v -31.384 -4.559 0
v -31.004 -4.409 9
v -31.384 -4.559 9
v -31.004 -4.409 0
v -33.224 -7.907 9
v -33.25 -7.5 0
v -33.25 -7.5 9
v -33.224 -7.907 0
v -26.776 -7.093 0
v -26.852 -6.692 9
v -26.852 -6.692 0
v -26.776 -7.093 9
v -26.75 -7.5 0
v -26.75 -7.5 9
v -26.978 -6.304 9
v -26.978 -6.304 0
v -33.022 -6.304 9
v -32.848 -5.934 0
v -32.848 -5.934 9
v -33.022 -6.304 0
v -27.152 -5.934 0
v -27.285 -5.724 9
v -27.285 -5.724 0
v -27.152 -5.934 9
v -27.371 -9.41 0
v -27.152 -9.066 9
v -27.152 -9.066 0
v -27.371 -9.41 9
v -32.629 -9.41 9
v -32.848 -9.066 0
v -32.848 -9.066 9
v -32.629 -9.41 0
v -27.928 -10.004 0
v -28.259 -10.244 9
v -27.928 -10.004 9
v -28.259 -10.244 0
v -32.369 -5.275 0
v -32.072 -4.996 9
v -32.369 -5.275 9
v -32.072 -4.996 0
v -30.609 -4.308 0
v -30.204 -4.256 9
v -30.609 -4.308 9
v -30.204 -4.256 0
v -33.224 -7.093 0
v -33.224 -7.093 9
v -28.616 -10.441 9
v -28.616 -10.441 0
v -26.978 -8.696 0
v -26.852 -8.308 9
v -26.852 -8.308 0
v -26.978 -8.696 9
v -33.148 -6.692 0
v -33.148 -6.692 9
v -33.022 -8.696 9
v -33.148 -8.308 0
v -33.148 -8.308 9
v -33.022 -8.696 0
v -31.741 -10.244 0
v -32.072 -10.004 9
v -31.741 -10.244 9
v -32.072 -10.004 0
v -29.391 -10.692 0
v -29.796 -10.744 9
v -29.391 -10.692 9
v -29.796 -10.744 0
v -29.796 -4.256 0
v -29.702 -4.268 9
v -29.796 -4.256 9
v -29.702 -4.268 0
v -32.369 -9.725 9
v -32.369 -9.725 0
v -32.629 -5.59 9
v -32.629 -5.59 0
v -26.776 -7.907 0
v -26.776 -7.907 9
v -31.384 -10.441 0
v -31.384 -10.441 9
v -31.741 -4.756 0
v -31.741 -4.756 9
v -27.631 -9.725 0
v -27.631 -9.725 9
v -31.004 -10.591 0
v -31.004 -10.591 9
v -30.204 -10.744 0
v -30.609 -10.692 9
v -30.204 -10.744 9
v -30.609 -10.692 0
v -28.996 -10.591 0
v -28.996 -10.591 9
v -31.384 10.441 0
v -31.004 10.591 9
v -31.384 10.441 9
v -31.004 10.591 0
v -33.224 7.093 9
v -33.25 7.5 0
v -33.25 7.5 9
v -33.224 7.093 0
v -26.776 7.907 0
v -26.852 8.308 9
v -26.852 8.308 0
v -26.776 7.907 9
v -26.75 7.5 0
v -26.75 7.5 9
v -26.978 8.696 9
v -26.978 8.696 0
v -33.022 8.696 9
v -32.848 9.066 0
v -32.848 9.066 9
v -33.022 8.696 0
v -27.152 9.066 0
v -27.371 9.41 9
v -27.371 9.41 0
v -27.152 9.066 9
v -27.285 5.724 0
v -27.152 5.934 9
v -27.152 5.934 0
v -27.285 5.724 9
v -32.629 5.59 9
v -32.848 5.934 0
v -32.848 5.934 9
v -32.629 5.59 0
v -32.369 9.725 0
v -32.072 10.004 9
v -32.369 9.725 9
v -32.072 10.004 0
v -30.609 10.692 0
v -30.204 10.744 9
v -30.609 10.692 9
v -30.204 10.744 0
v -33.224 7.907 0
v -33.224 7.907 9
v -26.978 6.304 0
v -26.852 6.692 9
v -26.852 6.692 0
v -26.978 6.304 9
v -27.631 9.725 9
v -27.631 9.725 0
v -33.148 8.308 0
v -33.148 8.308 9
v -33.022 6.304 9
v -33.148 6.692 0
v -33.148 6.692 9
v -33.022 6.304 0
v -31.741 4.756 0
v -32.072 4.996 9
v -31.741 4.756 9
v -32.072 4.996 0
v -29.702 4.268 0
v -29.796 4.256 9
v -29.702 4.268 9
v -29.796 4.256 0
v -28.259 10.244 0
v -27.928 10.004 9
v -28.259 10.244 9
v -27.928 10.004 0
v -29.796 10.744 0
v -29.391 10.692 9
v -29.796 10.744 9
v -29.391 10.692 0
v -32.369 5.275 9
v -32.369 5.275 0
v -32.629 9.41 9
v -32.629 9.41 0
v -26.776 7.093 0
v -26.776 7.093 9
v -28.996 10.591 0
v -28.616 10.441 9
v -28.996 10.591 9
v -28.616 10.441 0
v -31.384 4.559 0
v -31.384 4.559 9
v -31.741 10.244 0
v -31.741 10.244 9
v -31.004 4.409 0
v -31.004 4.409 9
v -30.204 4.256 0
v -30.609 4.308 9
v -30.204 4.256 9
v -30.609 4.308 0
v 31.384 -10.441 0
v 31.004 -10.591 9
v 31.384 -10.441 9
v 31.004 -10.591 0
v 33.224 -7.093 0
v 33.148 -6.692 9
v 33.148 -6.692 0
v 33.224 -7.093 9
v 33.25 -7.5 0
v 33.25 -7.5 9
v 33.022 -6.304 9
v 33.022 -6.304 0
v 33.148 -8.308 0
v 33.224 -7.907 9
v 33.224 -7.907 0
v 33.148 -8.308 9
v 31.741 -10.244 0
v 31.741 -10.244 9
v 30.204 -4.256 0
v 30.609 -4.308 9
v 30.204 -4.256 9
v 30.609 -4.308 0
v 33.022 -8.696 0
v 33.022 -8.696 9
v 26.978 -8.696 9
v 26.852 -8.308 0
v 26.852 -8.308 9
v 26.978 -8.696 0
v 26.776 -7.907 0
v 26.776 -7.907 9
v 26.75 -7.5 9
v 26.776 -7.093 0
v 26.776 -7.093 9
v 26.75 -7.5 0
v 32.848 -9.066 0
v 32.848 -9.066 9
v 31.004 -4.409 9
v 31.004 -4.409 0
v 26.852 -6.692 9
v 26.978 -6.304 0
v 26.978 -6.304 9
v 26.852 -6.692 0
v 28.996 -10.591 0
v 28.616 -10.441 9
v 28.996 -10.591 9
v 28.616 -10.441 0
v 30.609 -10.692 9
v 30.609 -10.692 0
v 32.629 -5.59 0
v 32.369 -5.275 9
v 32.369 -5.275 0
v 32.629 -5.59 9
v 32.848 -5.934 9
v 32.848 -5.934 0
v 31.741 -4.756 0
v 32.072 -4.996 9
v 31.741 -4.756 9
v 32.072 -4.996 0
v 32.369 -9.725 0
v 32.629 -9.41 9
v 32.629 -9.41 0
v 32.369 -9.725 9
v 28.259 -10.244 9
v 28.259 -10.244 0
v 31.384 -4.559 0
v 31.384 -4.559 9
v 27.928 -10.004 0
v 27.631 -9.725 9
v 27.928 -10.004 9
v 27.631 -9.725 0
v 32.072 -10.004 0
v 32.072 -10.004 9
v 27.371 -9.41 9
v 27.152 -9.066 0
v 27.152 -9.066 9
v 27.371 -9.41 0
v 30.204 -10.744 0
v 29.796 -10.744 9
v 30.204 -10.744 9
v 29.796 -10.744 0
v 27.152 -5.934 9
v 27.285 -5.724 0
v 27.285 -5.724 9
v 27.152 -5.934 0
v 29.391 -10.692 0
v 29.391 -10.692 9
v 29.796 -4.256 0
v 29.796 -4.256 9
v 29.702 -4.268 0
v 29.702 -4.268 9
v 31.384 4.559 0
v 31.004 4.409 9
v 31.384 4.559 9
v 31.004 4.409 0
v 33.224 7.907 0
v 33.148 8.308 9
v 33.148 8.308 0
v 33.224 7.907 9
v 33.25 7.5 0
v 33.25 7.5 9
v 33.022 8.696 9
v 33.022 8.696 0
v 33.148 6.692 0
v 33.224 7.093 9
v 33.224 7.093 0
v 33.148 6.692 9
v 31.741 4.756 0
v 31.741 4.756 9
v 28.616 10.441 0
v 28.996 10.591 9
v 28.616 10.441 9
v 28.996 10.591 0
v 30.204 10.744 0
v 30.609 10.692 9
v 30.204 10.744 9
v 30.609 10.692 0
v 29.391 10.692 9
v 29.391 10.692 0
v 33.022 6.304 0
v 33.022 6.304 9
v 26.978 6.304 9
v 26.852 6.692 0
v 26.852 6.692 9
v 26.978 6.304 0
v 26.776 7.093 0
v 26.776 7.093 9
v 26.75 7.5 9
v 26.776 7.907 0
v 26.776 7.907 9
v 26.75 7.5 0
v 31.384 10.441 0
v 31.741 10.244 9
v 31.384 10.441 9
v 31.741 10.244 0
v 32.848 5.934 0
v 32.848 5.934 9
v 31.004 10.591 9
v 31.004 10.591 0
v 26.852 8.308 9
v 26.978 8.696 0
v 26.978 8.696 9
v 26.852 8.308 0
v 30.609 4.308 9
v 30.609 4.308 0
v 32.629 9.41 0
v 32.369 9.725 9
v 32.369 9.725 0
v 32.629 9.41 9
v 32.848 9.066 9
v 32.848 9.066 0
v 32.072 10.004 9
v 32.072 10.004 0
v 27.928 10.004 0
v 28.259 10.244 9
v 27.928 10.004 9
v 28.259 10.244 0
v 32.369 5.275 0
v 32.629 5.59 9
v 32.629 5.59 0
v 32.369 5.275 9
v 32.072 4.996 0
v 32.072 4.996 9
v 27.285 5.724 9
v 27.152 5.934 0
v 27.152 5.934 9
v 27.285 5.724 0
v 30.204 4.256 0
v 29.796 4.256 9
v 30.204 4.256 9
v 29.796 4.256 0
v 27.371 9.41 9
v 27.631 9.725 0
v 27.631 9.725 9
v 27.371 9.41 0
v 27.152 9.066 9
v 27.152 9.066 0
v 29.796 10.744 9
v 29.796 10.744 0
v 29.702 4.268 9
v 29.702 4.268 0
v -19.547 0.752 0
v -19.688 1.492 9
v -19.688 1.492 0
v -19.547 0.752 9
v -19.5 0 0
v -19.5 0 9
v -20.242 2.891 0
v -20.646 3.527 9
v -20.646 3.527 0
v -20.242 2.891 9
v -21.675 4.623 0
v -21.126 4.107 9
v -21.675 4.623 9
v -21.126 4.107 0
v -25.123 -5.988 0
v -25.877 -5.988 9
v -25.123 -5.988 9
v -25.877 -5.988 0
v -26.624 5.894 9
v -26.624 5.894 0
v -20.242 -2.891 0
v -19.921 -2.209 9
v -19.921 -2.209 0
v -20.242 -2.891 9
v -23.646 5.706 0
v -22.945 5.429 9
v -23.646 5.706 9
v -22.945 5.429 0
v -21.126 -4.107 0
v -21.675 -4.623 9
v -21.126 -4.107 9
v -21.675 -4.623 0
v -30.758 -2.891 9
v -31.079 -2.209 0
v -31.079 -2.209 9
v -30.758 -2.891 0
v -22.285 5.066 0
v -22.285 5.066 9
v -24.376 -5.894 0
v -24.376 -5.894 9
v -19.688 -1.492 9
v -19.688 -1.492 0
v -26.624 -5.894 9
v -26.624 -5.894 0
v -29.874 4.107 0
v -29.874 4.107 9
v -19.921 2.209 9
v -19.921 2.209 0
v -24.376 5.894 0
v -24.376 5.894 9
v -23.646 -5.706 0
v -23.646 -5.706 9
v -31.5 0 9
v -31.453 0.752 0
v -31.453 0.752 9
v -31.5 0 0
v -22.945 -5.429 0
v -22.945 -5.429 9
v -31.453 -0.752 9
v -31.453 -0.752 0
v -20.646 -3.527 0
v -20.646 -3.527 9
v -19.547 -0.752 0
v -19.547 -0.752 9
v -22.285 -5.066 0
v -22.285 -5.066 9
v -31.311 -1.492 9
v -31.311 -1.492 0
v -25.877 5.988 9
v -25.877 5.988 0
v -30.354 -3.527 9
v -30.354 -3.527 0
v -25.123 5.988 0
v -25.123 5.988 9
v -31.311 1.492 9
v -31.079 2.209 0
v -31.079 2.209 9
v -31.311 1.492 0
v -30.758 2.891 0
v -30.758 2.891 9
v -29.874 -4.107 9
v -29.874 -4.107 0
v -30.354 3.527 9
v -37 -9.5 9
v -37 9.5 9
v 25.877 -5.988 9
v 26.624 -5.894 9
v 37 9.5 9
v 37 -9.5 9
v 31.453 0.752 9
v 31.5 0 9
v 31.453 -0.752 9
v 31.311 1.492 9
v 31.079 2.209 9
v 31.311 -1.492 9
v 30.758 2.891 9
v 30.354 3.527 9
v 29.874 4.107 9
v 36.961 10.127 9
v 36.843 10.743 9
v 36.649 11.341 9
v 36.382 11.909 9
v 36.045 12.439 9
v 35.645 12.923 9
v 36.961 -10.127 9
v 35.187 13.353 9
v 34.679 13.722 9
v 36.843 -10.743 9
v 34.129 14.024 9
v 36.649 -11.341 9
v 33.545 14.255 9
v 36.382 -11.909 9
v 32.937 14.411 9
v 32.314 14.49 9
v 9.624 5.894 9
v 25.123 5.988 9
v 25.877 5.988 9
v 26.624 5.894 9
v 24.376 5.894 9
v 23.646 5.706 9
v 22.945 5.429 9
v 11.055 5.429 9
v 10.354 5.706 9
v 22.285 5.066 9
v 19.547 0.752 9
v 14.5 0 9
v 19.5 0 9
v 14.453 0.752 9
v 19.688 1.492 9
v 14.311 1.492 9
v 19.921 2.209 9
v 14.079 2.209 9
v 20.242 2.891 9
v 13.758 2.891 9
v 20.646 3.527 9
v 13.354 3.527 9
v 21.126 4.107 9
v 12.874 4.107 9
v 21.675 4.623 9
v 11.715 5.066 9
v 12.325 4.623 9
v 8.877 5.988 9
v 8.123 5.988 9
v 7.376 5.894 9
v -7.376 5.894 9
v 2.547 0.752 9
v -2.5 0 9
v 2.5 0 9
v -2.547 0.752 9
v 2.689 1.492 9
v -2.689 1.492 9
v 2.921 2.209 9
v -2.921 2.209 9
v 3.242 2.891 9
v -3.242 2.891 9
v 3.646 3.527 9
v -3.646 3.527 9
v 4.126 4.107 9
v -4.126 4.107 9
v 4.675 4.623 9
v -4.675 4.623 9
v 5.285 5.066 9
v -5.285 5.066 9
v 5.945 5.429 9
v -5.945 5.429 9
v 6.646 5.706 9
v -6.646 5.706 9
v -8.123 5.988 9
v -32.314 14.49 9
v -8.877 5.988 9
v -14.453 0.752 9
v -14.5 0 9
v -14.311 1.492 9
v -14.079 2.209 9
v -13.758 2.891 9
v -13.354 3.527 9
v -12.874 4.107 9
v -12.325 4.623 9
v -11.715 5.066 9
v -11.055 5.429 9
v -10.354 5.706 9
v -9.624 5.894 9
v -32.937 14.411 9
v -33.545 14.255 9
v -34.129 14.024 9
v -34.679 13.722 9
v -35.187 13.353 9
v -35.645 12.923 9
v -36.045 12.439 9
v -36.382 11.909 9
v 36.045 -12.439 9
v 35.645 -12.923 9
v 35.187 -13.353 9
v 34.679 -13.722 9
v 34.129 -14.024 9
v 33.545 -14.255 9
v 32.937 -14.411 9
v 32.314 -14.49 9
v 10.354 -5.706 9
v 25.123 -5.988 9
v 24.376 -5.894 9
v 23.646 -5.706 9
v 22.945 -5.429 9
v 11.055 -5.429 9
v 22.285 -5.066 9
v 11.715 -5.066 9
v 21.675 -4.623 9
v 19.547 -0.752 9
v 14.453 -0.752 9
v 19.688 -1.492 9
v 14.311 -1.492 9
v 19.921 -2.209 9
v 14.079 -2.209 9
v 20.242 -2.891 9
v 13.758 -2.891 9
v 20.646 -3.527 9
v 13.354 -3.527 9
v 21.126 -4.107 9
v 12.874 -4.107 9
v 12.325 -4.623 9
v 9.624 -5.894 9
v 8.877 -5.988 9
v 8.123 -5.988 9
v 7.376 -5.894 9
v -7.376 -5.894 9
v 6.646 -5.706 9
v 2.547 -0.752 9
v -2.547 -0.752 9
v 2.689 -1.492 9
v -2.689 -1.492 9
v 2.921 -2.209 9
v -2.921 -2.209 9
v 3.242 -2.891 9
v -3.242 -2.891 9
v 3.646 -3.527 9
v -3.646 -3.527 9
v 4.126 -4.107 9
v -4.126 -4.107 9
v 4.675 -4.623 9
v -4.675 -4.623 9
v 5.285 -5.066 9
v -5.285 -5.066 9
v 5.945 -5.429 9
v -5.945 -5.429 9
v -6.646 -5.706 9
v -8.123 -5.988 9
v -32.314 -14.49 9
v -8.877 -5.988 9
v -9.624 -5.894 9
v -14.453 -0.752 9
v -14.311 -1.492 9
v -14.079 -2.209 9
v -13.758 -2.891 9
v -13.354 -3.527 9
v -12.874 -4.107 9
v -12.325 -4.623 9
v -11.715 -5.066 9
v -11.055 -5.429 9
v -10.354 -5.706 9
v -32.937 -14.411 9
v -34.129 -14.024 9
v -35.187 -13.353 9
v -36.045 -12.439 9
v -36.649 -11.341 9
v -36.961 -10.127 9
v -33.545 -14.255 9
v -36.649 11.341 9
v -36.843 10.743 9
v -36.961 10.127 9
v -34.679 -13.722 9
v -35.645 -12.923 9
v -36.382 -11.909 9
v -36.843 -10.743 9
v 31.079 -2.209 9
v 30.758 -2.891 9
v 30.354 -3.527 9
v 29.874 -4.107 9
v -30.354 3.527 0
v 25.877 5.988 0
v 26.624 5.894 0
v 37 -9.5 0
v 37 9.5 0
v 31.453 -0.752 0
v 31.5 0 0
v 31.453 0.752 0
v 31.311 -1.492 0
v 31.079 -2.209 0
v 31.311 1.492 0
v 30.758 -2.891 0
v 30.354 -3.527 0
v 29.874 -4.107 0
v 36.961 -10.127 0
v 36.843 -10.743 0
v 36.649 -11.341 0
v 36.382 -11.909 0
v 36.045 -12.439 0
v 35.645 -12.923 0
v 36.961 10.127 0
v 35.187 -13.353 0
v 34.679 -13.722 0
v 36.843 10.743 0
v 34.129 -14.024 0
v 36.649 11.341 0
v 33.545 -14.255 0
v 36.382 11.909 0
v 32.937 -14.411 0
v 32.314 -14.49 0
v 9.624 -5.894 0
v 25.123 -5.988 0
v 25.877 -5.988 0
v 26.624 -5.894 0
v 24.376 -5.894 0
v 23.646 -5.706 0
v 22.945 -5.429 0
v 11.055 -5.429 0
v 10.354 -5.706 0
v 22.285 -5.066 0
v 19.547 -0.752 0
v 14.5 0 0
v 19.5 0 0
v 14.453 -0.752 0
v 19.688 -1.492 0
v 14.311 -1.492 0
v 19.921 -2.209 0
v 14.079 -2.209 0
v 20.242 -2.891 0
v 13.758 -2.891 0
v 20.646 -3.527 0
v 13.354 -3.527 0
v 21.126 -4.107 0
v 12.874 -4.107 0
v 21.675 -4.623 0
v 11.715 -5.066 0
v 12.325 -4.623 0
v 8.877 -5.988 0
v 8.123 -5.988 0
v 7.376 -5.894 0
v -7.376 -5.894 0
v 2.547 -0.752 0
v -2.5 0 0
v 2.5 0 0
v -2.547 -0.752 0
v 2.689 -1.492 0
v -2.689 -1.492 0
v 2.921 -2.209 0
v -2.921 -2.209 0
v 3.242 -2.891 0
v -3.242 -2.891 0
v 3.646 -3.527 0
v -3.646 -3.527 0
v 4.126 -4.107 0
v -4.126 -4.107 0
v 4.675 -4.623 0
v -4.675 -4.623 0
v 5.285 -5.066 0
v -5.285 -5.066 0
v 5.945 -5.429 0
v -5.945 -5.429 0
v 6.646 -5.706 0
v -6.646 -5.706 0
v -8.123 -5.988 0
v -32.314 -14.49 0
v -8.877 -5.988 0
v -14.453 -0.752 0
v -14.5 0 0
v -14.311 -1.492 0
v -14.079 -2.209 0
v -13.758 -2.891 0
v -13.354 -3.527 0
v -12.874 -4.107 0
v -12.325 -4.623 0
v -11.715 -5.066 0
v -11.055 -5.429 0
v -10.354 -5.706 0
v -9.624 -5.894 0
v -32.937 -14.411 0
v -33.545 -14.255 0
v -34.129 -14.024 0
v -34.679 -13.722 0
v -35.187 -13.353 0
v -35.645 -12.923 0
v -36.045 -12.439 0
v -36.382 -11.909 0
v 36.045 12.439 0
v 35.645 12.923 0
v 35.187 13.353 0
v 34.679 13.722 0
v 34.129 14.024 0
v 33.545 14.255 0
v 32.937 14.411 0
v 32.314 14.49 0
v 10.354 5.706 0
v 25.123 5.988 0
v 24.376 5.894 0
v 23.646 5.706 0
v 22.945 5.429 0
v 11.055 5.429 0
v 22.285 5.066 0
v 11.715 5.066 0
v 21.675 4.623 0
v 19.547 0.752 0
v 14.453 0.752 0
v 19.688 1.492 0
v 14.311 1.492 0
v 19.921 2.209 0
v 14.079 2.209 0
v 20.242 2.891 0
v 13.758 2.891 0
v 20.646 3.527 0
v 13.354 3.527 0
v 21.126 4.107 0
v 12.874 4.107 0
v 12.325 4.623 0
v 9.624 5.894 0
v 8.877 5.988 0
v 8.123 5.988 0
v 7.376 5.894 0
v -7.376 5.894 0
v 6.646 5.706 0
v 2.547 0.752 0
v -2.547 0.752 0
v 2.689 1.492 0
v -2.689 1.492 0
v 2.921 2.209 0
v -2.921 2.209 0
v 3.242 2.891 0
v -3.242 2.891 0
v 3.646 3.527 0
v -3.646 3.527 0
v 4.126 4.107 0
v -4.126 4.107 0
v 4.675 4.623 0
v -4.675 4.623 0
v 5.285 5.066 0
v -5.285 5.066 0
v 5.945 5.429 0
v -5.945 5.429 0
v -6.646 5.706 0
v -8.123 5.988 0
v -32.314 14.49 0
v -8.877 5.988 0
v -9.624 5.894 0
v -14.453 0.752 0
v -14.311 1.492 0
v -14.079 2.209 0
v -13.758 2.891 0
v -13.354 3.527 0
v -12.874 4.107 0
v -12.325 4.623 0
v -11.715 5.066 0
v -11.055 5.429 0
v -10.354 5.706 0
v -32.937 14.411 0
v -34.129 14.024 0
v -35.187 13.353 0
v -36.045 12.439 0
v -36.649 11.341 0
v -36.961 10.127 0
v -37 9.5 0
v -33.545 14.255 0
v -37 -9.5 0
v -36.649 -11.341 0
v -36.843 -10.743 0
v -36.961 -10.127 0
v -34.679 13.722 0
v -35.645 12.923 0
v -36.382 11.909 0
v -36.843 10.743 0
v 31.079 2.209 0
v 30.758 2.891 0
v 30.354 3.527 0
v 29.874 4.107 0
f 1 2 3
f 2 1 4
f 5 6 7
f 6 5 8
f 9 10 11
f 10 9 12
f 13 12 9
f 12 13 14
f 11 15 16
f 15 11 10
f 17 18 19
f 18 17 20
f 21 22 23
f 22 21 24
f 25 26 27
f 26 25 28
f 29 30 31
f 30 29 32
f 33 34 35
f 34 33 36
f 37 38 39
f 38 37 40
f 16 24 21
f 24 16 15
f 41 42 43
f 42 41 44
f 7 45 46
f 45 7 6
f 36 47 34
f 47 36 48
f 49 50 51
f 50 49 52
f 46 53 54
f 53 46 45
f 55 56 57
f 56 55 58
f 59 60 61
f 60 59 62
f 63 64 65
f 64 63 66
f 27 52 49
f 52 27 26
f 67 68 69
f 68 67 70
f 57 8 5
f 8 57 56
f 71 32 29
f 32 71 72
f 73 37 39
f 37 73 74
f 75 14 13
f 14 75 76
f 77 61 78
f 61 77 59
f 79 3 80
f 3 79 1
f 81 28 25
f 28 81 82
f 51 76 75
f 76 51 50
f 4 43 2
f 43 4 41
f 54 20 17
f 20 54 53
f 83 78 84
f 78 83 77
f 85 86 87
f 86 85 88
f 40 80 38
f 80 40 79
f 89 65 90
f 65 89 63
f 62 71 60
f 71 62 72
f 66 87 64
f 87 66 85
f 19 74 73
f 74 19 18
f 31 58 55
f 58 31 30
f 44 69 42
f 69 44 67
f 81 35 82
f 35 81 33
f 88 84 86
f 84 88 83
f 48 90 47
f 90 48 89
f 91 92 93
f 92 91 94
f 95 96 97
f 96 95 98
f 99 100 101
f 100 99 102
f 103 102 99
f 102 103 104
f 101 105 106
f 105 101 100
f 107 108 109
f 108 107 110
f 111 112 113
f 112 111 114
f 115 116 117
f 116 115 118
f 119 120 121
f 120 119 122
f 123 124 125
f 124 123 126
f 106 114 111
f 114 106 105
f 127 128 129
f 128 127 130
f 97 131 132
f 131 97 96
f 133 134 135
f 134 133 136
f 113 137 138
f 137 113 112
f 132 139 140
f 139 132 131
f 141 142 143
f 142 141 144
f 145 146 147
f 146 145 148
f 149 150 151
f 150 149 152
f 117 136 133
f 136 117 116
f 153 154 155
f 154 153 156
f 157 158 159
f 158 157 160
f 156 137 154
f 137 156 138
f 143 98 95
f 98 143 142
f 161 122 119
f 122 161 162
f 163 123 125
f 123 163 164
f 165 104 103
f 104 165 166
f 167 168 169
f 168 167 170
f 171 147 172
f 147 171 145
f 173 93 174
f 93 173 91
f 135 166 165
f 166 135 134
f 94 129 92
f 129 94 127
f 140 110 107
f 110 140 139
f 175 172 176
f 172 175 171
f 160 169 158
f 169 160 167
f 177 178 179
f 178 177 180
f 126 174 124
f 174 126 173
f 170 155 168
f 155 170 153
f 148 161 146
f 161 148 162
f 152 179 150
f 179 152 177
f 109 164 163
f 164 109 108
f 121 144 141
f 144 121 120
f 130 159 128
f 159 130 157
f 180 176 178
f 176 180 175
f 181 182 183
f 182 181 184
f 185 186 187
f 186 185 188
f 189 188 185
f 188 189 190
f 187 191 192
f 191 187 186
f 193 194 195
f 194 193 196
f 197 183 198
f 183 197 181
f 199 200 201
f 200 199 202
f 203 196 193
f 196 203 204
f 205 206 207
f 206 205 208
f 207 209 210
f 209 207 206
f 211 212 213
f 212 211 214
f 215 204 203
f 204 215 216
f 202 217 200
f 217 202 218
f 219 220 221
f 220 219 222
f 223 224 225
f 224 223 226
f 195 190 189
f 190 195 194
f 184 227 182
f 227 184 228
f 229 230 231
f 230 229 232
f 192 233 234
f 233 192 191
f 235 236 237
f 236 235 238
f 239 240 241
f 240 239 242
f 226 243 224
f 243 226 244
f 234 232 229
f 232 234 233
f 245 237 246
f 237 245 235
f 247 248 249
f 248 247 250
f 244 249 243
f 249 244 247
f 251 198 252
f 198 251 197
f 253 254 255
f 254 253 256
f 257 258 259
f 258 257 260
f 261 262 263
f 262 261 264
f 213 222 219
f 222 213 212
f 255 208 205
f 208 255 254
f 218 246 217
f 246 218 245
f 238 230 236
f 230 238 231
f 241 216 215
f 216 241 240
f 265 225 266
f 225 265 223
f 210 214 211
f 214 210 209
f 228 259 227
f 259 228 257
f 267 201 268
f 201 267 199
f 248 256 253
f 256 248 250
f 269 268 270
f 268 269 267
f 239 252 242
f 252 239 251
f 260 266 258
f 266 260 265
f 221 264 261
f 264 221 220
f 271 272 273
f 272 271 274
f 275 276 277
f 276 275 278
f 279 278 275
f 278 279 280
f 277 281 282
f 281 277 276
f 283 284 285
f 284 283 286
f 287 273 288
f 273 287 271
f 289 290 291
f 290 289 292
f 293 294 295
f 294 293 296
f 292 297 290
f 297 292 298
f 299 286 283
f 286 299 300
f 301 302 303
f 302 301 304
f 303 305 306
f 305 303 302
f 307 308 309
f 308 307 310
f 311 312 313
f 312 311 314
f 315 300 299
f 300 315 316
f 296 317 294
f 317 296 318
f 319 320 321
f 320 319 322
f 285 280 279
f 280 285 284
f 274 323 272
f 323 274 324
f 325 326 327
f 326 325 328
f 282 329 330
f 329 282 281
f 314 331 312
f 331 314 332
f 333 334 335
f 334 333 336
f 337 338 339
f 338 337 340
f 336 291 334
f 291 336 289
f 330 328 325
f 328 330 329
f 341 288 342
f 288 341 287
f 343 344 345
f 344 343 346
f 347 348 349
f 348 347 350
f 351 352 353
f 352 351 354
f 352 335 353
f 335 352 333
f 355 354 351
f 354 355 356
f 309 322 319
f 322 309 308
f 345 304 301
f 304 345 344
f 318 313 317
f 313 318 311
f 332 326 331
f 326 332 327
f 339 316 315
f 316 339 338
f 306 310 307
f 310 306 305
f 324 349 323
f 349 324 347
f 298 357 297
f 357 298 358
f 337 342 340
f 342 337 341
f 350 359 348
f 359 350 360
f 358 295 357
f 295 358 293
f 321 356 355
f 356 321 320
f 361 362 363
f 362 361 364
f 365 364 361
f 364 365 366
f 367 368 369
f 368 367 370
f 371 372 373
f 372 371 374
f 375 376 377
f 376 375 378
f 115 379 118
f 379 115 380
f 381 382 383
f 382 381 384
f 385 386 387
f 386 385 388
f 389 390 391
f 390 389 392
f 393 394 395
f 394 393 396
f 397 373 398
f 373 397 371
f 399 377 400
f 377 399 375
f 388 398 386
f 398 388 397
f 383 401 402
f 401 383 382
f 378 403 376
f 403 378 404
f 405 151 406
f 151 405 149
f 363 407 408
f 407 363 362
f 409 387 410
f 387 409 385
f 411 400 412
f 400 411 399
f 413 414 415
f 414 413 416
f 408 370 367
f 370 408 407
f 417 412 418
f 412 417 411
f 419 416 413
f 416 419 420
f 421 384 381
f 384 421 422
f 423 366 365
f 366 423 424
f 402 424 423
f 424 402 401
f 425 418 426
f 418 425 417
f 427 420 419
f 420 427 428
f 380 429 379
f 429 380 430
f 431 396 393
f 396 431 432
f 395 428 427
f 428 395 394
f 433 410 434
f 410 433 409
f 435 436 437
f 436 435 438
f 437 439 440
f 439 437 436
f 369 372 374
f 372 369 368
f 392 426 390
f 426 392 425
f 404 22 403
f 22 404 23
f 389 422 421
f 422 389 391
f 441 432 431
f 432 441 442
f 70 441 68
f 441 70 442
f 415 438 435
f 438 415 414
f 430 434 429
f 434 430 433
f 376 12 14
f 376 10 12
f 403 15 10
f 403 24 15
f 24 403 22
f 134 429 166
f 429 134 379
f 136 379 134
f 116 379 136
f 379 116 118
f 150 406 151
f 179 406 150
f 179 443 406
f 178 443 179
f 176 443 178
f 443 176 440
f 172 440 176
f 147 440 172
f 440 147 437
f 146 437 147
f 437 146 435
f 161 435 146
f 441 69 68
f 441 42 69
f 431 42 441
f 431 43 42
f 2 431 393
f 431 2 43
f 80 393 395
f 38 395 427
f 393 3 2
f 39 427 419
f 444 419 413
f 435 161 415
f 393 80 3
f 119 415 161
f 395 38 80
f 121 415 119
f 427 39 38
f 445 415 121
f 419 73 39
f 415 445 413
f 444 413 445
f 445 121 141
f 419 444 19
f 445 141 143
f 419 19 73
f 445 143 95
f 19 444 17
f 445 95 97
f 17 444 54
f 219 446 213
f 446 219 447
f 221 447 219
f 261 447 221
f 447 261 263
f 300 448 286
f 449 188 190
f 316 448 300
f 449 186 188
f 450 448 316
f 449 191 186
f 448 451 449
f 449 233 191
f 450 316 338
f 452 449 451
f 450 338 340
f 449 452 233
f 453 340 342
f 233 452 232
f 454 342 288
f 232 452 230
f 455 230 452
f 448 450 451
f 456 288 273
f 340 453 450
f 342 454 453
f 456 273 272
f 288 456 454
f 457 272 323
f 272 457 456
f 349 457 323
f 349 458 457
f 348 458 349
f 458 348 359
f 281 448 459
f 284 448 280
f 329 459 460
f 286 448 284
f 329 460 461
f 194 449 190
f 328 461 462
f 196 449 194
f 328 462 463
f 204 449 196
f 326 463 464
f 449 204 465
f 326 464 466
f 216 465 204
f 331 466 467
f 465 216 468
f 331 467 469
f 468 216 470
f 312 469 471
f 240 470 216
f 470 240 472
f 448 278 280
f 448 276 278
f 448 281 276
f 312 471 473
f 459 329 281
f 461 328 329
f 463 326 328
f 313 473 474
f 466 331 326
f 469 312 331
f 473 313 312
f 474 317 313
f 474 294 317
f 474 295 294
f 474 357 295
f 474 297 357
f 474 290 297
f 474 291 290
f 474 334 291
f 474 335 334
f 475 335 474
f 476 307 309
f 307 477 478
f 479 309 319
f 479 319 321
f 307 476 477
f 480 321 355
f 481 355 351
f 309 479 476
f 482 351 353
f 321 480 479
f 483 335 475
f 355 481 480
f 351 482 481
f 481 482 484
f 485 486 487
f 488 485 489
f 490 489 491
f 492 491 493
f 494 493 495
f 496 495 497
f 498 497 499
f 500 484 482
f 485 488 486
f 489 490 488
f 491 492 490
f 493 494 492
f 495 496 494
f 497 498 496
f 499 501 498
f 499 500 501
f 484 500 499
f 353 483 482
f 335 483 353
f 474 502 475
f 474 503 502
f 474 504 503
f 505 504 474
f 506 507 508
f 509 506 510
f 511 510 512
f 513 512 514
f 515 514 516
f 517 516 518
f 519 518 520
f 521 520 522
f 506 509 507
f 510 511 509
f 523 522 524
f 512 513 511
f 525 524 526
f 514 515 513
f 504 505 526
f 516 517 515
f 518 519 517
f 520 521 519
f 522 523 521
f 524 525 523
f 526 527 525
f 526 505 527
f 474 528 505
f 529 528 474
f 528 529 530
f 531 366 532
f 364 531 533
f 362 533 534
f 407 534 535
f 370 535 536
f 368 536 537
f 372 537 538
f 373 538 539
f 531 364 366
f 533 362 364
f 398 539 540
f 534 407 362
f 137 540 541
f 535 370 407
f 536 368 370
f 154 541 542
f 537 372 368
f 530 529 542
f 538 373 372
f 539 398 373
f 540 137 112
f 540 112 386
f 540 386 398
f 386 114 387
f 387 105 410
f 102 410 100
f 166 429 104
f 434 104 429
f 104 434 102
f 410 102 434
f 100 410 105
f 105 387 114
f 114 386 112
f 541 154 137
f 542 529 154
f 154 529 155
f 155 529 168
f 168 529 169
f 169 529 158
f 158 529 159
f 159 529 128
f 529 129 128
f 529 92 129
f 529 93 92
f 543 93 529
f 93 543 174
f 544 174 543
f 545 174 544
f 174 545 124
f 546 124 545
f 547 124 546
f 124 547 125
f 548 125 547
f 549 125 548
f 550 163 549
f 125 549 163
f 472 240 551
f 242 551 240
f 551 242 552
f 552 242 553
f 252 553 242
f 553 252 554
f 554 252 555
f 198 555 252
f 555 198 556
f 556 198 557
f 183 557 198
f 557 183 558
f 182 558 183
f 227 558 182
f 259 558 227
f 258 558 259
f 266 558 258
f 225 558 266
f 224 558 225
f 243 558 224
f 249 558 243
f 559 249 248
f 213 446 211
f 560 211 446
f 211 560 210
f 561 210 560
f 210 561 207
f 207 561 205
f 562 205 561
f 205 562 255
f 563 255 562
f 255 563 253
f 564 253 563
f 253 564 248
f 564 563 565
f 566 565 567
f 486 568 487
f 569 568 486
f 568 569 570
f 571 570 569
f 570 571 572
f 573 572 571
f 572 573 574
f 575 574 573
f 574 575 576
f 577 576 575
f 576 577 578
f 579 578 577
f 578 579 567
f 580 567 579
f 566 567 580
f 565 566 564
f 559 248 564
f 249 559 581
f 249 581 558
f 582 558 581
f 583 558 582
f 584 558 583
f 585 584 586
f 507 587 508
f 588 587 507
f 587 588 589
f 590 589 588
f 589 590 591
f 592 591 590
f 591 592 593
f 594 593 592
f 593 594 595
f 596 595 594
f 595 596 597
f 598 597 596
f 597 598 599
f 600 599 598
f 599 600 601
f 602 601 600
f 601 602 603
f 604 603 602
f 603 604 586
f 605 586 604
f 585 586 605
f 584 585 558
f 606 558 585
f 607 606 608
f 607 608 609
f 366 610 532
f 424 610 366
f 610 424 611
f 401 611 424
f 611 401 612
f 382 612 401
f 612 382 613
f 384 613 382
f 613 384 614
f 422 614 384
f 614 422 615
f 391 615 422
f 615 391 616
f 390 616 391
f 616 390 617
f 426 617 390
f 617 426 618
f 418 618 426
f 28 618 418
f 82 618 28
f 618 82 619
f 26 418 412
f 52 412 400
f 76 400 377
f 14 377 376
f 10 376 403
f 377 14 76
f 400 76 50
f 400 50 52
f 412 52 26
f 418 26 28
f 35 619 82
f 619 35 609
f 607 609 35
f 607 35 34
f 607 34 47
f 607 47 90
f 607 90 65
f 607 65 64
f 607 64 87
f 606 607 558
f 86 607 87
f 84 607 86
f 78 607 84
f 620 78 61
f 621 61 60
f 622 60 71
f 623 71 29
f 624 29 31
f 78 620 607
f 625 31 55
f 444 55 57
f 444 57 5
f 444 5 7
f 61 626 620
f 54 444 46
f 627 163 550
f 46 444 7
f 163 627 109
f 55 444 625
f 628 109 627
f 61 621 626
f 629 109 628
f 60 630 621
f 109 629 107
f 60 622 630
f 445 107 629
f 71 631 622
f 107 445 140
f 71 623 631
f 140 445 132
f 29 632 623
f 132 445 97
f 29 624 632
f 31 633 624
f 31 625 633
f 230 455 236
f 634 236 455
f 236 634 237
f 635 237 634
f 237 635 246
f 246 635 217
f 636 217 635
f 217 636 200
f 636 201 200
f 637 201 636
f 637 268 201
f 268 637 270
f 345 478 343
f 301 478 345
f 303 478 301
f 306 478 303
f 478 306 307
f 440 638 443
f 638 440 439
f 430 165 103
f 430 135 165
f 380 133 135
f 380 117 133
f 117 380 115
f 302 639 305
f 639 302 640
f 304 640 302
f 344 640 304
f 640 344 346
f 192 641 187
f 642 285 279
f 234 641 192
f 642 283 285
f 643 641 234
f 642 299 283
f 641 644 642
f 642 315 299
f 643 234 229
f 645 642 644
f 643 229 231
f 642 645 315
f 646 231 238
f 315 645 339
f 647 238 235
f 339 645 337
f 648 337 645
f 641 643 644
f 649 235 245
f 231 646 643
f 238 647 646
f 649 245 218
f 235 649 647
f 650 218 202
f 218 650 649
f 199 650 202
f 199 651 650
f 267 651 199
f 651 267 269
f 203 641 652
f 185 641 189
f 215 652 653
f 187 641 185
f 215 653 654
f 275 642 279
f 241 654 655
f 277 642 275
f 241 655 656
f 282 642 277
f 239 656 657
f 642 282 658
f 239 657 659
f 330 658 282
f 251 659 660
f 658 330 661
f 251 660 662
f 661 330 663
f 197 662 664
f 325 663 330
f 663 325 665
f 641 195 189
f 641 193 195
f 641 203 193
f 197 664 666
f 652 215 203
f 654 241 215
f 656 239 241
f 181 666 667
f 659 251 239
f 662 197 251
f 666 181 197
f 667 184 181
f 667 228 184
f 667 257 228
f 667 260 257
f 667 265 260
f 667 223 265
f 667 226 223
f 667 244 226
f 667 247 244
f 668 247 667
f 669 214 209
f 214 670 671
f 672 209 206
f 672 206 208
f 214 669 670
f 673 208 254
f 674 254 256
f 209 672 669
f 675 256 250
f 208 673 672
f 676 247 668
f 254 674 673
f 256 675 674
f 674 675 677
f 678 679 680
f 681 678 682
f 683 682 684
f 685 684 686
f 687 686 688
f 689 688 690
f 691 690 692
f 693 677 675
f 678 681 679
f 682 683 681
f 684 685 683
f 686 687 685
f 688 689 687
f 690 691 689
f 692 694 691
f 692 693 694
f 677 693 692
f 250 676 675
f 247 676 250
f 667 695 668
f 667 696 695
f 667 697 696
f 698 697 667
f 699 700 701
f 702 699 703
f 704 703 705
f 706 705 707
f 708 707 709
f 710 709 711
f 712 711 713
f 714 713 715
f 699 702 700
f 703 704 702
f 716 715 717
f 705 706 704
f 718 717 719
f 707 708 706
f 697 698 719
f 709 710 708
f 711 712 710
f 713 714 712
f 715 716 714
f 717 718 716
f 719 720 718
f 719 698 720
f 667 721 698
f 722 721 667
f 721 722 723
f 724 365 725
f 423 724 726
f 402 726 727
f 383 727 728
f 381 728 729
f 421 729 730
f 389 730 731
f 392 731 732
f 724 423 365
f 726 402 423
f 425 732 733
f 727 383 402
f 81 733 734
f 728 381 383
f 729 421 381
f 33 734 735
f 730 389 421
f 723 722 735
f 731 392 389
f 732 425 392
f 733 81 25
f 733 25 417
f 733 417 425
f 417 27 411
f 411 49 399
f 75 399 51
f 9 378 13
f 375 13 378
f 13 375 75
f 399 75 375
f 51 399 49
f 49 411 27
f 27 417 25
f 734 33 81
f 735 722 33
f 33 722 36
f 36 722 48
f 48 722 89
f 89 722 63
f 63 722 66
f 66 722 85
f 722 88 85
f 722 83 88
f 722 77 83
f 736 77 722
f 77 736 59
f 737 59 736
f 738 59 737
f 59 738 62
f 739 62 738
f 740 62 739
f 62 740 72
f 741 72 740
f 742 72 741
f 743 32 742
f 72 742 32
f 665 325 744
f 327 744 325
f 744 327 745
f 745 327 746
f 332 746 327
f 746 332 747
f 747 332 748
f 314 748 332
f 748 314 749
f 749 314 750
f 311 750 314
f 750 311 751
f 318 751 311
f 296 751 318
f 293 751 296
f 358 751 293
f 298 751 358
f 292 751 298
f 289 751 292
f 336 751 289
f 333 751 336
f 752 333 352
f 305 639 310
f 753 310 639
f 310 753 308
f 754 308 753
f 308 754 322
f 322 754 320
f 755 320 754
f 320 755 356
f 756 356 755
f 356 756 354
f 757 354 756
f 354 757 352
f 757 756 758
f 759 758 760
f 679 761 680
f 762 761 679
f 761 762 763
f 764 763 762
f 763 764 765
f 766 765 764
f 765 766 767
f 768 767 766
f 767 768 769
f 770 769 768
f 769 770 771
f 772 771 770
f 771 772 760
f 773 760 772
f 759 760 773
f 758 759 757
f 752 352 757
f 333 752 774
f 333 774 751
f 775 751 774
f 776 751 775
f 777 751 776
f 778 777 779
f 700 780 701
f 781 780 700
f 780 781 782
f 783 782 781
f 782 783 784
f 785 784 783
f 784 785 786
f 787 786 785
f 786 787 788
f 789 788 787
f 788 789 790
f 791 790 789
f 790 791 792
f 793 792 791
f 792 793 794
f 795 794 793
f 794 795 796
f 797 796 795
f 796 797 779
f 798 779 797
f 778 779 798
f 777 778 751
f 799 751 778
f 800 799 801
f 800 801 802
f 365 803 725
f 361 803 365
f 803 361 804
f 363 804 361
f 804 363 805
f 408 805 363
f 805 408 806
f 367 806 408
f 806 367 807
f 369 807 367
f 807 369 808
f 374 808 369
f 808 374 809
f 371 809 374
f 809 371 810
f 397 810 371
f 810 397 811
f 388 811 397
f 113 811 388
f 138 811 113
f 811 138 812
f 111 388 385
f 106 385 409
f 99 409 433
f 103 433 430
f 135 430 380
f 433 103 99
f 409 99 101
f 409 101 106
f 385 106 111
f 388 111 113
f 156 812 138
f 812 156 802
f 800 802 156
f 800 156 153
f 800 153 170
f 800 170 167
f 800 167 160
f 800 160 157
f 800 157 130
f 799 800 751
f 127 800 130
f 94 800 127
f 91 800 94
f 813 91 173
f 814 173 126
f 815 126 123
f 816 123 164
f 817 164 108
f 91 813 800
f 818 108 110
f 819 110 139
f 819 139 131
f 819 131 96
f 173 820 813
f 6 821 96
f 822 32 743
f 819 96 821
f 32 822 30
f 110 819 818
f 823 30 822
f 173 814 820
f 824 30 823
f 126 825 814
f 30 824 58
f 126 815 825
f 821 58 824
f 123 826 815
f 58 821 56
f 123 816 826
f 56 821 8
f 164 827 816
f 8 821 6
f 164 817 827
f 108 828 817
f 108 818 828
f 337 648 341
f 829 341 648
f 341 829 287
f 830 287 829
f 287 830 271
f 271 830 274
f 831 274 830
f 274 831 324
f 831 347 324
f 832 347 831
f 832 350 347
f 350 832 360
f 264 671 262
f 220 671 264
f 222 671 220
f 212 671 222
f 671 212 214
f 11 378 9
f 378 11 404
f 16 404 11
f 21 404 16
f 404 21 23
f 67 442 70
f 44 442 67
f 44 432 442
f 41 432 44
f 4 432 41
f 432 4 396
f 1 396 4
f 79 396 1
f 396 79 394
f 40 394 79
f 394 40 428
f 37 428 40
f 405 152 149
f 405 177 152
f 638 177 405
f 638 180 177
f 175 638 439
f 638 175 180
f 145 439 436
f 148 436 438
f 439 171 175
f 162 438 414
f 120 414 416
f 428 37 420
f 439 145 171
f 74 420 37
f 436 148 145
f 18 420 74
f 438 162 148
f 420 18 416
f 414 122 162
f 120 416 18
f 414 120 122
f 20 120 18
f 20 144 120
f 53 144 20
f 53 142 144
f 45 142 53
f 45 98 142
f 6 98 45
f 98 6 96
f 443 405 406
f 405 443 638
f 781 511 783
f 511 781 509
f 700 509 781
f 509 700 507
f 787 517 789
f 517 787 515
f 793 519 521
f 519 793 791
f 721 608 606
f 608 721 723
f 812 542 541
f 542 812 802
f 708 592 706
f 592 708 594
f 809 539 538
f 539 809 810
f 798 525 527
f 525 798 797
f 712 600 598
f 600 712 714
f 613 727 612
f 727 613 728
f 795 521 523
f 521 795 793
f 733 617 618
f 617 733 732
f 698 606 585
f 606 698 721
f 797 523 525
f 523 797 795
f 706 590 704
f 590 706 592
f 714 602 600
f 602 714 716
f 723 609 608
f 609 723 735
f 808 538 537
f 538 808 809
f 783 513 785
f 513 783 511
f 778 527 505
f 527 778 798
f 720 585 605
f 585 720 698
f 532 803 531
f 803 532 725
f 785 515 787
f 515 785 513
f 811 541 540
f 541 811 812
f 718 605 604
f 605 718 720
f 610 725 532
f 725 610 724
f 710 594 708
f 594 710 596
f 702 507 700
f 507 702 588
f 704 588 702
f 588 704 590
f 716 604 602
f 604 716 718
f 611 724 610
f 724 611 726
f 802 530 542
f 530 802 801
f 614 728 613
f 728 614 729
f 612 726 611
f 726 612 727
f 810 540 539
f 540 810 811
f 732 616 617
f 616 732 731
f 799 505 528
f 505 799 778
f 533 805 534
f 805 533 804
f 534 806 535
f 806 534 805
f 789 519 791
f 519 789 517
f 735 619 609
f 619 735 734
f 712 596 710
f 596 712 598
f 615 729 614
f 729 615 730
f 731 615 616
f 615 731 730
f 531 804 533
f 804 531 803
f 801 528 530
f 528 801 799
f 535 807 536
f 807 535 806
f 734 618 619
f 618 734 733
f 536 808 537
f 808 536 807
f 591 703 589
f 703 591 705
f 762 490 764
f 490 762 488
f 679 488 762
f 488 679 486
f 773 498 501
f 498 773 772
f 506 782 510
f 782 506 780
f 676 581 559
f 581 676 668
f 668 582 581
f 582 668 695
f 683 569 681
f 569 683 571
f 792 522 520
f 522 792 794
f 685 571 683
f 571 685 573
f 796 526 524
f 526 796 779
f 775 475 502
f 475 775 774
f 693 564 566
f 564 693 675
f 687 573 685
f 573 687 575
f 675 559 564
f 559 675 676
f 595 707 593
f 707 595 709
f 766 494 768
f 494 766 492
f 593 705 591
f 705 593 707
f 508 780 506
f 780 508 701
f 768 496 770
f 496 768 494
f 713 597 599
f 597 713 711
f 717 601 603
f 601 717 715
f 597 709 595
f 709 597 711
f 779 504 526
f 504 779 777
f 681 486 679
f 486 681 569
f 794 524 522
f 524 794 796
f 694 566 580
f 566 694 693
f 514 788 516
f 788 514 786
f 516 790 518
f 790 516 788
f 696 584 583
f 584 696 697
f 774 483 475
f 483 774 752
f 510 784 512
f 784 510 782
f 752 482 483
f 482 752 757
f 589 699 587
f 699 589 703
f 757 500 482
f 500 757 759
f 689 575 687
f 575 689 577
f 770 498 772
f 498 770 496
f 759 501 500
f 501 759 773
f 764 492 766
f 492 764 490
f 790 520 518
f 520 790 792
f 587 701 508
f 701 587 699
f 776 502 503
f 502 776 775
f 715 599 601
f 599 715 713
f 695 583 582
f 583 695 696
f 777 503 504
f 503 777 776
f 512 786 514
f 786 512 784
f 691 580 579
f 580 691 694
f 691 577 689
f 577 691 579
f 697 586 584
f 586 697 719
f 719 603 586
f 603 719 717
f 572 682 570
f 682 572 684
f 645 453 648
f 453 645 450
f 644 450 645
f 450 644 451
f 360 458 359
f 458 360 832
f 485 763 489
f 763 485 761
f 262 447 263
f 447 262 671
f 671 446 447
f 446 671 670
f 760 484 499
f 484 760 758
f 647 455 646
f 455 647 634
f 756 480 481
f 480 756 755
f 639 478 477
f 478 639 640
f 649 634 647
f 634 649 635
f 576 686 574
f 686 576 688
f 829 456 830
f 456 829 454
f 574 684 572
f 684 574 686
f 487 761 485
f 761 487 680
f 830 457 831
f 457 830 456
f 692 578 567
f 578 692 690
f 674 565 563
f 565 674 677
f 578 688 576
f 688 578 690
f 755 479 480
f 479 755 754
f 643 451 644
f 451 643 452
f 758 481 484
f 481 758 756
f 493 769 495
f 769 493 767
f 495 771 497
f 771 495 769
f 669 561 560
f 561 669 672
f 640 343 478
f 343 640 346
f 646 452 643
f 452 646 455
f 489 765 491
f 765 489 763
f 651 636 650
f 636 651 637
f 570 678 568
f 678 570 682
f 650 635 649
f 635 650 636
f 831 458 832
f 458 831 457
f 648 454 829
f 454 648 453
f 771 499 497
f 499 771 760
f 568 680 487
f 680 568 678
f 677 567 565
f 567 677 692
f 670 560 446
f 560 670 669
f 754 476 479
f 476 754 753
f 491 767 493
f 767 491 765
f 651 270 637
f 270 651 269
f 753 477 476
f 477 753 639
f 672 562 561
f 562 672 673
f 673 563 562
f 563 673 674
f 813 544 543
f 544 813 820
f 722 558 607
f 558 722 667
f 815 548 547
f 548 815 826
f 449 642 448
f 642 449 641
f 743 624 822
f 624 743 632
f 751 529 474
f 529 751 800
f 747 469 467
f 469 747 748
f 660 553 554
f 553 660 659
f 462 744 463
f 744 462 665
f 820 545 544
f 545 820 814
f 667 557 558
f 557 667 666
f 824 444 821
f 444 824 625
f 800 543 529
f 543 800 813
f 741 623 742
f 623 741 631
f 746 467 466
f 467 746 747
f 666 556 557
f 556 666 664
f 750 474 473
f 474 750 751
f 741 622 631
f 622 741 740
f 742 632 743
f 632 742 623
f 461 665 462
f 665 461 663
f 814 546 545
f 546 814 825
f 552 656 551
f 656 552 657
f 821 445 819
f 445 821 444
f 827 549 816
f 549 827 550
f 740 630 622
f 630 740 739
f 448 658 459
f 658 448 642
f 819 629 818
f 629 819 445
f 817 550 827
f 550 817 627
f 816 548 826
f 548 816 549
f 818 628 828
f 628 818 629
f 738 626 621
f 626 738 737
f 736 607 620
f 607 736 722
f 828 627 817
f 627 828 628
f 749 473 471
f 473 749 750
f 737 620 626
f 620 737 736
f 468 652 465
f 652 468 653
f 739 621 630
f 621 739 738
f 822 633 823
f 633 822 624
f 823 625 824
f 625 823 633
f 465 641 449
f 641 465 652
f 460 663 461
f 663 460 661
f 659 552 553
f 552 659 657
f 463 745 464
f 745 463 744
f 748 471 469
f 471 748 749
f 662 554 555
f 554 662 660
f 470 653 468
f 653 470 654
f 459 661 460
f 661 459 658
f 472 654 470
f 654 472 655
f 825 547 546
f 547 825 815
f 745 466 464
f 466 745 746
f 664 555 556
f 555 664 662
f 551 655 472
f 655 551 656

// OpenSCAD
$fn = 50;

difference() {
	union() {
		hull() {
			translate(v = [-32.0, 9.5, 0]) {
				cylinder(h = 9, r = 5);
			}
			translate(v = [32.0, 9.5, 0]) {
				cylinder(h = 9, r = 5);
			}
			translate(v = [-32.0, -9.5, 0]) {
				cylinder(h = 9, r = 5);
			}
			translate(v = [32.0, -9.5, 0]) {
				cylinder(h = 9, r = 5);
			}
		}
	}
	union() {
		translate(v = [-30.0, -7.5, -100.0]) {
			cylinder(h = 200, r = 3.25);
		}
		translate(v = [-30.0, 7.5, -100.0]) {
			cylinder(h = 200, r = 3.25);
		}
		translate(v = [30.0, -7.5, -100.0]) {
			cylinder(h = 200, r = 3.25);
		}
		translate(v = [30.0, 7.5, -100.0]) {
			cylinder(h = 200, r = 3.25);
		}
		translate(v = [-30.0, -7.5, -100.0]) {
			cylinder(h = 200, r = 1.8);
		}
		translate(v = [-30.0, 7.5, -100.0]) {
			cylinder(h = 200, r = 1.8);
		}
		translate(v = [30.0, -7.5, -100.0]) {
			cylinder(h = 200, r = 1.8);
		}
		translate(v = [30.0, 7.5, -100.0]) {
			cylinder(h = 200, r = 1.8);
		}
		translate(v = [-25.5, 0, 0.0]) {
			cylinder(h = 9, r = 6.0);
		}
		translate(v = [-8.5, 0, 0.0]) {
			cylinder(h = 9, r = 6.0);
		}
		translate(v = [8.5, 0, 0.0]) {
			cylinder(h = 9, r = 6.0);
		}
		translate(v = [25.5, 0, 0.0]) {
			cylinder(h = 9, r = 6.0);
		}
	}
}
